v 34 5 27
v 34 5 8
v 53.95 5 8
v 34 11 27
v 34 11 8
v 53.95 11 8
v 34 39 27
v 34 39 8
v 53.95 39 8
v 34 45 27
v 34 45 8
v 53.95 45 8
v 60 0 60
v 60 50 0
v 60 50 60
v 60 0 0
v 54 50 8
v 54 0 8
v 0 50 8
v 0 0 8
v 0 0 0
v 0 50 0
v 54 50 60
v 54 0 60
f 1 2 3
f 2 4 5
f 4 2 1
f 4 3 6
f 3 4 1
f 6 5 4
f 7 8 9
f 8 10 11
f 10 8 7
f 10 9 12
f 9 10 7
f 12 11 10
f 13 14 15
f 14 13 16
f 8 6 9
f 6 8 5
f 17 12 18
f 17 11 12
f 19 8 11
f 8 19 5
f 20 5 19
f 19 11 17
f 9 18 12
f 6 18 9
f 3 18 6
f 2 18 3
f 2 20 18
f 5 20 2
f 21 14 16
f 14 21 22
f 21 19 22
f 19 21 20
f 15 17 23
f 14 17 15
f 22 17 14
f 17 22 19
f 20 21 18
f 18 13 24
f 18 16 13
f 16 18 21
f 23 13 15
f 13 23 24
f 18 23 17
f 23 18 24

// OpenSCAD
$fn = 32;

// ----------------------------------------------------------------------
// Rib bracket: 2-gusset L bracket
// ----------------------------------------------------------------------

// --- parameters (mm) ---
base_l = 60;              // foot length, X
base_w = 50;              // foot width, Y
base_t = 8;               // foot thickness
plate_t = 6;              // upright plate thickness
plate_h = 60;             // overall height
gus_l = 20;               // gusset leg along the foot
gus_h = 20;               // gusset height
gus_t = 6;                // gusset thickness
gus_edge = 5;             // gusset margin from the foot edge
n_gus = 2;                // gusset count

gus_pitch = (base_w - 2 * gus_edge - gus_t) / (n_gus - 1);  // gusset pitch

union() {
  cube([base_l, base_w, base_t]);
  translate([base_l - plate_t, 0, base_t - 1])
    cube([plate_t, base_w, plate_h - base_t + 1]);
  for (i = [0 : n_gus - 1])
    translate([base_l - plate_t - gus_l, gus_edge + i * gus_pitch, base_t - 1])
      rotate([-90, 0, 0])
        linear_extrude(height = gus_t)
          polygon(points = [[0, 0], [gus_l + 1, 0], [0, -gus_h]]);
}
